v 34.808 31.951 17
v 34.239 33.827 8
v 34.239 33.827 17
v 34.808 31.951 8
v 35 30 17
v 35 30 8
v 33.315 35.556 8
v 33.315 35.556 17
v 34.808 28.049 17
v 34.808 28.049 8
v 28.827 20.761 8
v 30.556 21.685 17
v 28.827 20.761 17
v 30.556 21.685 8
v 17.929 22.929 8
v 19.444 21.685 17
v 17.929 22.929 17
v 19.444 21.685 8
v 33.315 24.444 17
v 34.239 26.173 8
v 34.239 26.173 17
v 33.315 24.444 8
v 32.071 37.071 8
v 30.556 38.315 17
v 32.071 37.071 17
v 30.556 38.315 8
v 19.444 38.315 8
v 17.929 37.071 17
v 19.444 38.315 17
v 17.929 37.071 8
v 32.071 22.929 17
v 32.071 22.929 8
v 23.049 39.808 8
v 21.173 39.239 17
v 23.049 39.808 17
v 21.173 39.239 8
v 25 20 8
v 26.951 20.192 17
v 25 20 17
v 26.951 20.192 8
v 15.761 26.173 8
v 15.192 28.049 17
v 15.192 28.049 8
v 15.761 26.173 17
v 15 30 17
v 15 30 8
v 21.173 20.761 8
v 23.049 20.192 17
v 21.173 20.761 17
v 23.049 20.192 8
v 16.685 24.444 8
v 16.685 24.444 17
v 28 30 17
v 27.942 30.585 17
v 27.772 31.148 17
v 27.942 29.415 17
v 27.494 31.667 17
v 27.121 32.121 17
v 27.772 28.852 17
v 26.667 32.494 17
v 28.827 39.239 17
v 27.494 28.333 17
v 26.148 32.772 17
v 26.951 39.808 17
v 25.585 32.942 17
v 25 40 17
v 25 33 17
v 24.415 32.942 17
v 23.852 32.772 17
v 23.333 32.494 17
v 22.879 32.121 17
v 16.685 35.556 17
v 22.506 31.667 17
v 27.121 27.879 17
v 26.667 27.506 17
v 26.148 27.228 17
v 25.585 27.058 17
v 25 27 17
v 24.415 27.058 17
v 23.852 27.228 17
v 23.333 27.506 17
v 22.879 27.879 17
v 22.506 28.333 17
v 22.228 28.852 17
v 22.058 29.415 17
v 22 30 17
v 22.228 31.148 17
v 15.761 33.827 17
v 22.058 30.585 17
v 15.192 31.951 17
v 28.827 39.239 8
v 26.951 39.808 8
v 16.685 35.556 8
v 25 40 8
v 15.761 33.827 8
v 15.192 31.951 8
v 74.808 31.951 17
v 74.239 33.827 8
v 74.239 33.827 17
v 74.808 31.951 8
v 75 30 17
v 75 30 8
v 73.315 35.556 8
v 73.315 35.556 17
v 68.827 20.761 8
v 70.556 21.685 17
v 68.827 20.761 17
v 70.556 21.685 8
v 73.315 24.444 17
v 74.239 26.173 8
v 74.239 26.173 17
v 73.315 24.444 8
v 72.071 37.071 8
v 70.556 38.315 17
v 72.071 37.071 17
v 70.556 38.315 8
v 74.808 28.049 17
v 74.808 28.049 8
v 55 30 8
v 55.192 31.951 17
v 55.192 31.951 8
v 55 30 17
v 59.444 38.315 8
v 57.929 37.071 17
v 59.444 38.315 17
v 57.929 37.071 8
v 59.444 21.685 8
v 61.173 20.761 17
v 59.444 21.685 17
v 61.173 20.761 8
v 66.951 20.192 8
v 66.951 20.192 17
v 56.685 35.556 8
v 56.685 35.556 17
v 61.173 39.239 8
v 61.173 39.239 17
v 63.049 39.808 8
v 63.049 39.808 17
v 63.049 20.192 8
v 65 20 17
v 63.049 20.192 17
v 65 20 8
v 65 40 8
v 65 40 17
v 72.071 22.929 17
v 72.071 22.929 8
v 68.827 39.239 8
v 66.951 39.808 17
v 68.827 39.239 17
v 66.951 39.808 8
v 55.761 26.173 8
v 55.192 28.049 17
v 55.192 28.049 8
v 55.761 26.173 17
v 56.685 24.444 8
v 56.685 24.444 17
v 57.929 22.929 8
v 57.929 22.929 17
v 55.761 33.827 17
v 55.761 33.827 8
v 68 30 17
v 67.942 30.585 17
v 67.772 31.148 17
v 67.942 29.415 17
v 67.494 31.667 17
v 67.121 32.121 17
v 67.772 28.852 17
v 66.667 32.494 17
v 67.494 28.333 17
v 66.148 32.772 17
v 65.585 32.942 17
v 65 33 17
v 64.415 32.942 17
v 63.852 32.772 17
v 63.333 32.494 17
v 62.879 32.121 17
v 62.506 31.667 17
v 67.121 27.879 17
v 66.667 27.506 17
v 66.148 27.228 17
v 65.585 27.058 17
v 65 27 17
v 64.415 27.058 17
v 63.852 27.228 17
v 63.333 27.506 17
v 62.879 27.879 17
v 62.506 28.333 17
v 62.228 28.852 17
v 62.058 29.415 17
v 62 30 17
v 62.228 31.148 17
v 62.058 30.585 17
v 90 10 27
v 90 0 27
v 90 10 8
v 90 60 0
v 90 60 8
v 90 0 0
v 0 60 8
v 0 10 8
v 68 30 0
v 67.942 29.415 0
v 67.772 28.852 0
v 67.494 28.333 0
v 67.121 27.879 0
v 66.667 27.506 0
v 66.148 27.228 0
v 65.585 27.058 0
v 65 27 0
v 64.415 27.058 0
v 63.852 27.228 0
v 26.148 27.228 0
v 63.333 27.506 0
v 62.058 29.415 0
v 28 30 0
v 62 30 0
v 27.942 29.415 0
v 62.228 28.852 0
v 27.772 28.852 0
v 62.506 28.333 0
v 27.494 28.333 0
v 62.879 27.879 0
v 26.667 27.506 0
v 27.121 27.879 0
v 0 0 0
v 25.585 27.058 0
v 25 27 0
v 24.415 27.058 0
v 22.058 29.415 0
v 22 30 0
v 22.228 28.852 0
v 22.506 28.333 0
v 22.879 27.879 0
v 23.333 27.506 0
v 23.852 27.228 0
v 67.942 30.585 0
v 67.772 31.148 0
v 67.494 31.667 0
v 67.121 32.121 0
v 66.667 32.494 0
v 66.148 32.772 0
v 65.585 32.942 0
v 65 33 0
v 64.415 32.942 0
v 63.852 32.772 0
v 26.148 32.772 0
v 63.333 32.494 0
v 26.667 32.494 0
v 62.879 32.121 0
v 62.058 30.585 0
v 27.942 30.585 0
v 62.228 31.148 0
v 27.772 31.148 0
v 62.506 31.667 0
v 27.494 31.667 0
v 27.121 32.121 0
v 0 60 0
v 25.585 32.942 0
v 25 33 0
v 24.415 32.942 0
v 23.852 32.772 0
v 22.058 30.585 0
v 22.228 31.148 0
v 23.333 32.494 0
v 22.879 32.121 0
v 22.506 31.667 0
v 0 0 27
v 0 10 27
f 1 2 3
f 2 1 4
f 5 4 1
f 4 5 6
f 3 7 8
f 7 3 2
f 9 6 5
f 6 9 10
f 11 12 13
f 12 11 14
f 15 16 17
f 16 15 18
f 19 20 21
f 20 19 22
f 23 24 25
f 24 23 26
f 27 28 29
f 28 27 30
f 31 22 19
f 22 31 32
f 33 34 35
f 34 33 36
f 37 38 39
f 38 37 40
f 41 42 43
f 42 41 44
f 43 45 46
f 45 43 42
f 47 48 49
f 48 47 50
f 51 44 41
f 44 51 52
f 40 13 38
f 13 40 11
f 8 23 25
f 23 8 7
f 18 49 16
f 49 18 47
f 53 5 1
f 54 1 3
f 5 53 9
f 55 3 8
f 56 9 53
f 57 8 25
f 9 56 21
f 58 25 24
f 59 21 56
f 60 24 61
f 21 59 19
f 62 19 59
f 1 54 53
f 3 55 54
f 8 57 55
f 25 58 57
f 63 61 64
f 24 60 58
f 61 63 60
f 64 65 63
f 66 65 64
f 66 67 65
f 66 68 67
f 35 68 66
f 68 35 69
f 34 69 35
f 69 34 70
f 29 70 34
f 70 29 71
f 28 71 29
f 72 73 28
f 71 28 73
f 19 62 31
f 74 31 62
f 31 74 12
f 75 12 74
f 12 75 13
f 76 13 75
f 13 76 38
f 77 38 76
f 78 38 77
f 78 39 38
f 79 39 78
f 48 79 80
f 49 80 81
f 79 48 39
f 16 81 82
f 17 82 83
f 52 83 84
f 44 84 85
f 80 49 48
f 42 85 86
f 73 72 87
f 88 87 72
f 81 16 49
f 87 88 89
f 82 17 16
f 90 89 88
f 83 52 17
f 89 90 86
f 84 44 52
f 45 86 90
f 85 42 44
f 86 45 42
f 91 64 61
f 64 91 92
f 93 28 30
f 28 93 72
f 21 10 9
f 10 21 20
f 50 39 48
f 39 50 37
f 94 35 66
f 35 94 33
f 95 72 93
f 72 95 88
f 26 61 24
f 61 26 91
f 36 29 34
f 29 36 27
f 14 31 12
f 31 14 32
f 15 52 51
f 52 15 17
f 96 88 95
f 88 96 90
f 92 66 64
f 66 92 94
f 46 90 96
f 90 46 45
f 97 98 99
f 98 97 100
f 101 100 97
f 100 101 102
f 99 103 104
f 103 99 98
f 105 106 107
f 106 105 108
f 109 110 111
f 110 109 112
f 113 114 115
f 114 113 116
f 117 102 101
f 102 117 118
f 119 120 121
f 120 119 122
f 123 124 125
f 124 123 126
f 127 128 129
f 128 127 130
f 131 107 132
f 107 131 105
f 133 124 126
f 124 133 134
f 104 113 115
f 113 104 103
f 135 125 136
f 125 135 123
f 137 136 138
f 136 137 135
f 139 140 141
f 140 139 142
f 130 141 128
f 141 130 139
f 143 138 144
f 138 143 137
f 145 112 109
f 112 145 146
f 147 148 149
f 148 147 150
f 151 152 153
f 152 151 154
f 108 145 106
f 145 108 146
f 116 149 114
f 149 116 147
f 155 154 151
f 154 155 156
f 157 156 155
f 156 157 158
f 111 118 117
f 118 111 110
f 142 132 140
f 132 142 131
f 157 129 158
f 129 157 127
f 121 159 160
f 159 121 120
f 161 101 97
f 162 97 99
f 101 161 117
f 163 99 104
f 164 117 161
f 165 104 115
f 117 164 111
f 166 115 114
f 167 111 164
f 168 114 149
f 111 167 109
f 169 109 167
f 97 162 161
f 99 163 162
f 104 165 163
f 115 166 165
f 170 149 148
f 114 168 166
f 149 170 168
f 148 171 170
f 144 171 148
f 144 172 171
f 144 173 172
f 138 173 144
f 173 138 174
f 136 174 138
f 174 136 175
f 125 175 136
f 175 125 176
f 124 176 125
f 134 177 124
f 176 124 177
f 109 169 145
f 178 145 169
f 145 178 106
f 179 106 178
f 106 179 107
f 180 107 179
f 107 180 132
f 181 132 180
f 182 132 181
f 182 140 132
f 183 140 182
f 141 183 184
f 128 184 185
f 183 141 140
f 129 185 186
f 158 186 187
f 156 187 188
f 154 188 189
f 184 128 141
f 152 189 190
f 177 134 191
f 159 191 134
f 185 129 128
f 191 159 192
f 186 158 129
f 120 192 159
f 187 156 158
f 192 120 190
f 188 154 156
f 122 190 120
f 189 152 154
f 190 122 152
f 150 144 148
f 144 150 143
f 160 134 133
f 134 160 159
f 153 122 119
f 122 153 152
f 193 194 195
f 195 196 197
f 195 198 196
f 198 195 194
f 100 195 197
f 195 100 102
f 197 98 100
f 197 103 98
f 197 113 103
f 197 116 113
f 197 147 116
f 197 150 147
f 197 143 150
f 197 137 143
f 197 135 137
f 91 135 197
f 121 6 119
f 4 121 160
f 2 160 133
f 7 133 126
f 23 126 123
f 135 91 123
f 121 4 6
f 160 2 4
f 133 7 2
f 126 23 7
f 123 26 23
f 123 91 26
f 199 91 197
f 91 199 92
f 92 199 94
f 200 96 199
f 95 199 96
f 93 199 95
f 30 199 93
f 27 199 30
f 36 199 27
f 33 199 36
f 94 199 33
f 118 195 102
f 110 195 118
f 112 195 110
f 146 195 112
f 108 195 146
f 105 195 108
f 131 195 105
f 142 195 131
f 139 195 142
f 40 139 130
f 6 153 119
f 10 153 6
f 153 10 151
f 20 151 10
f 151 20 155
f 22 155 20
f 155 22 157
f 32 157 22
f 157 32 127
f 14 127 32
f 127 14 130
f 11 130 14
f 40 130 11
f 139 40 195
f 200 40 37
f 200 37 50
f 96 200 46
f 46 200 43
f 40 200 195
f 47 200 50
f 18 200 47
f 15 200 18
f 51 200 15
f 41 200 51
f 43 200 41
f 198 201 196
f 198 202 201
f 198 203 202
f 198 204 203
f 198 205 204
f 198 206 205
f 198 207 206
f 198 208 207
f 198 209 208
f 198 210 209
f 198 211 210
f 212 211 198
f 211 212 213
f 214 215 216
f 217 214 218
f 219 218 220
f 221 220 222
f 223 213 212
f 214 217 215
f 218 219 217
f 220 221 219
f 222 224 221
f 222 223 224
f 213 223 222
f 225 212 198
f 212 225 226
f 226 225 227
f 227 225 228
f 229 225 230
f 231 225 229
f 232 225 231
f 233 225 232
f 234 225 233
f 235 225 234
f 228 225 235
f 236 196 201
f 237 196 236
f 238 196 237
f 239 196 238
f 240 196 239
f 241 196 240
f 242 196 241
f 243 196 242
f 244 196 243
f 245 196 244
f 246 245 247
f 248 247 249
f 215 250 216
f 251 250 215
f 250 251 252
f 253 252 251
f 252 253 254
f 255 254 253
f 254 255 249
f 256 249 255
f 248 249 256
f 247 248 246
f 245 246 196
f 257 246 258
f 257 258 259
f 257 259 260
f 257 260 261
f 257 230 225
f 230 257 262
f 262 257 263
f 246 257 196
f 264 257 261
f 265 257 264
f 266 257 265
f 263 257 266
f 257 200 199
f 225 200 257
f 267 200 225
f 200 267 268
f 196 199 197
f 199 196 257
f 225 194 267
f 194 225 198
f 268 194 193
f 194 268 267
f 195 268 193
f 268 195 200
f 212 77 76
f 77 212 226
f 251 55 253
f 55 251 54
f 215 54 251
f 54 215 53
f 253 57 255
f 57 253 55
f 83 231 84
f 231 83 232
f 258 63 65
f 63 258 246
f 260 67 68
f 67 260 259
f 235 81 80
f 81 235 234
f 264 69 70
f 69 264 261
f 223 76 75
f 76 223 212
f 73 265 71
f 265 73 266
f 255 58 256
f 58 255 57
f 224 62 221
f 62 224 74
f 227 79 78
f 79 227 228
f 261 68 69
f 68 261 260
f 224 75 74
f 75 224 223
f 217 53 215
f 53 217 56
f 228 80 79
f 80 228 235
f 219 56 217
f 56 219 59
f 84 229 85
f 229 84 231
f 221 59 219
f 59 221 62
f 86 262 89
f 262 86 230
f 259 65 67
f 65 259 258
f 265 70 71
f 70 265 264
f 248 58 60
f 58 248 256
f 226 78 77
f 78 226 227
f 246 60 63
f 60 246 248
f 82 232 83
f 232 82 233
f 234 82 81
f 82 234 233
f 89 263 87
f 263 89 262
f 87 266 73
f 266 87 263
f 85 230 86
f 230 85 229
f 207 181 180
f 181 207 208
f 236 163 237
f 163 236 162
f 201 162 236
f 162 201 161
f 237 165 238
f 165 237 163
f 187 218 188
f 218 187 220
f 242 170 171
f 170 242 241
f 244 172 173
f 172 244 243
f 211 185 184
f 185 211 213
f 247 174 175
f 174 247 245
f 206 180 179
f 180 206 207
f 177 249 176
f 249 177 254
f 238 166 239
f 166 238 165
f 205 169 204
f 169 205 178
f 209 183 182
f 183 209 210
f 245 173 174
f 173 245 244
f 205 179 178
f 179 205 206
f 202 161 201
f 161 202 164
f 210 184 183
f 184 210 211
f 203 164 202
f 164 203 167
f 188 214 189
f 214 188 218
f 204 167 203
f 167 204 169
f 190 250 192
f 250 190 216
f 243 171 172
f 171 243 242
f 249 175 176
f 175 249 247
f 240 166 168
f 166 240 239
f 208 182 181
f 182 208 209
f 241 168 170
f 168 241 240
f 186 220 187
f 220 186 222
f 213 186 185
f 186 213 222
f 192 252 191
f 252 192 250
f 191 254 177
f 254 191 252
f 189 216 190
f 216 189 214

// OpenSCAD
$fn = 32;

// ----------------------------------------------------------------------
// Drill jig: fence jig
// ----------------------------------------------------------------------

// --- parameters (mm) ---
plate_l = 90;             // plate length, X
plate_w = 60;             // plate width, Y
plate_t = 8;              // plate thickness
boss_d = 20;              // guide boss diameter
boss_h = 10;              // boss height above the plate
guide_d = 6;              // guide hole diameter
boss_pitch = 40;          // boss pitch
fence_h = 20;             // fence height above the plate
fence_t = 10;             // fence thickness

n_boss = 2;  // guide bosses
boss_x0 = (plate_l - (n_boss - 1) * boss_pitch) / 2;  // first boss X
boss_top = plate_t - 1 + boss_h;  // boss crown height
fence_top = plate_t - 1 + fence_h;  // fence crown height
total_h = max([fence_top, boss_top]);  // overall height

difference() {
  union() {
  cube([plate_l, plate_w, plate_t]);
  for (i = [0 : n_boss - 1])
    translate([boss_x0 + i * boss_pitch, plate_w / 2, plate_t - 1])
      cylinder(h = boss_h, d = boss_d);
  translate([0, 0, plate_t - 1]) cube([plate_l, fence_t, fence_h]);
  }
  for (i = [0 : n_boss - 1])
    translate([boss_x0 + i * boss_pitch, plate_w / 2, -1])
      cylinder(h = plate_t + boss_h, d = guide_d);
}
